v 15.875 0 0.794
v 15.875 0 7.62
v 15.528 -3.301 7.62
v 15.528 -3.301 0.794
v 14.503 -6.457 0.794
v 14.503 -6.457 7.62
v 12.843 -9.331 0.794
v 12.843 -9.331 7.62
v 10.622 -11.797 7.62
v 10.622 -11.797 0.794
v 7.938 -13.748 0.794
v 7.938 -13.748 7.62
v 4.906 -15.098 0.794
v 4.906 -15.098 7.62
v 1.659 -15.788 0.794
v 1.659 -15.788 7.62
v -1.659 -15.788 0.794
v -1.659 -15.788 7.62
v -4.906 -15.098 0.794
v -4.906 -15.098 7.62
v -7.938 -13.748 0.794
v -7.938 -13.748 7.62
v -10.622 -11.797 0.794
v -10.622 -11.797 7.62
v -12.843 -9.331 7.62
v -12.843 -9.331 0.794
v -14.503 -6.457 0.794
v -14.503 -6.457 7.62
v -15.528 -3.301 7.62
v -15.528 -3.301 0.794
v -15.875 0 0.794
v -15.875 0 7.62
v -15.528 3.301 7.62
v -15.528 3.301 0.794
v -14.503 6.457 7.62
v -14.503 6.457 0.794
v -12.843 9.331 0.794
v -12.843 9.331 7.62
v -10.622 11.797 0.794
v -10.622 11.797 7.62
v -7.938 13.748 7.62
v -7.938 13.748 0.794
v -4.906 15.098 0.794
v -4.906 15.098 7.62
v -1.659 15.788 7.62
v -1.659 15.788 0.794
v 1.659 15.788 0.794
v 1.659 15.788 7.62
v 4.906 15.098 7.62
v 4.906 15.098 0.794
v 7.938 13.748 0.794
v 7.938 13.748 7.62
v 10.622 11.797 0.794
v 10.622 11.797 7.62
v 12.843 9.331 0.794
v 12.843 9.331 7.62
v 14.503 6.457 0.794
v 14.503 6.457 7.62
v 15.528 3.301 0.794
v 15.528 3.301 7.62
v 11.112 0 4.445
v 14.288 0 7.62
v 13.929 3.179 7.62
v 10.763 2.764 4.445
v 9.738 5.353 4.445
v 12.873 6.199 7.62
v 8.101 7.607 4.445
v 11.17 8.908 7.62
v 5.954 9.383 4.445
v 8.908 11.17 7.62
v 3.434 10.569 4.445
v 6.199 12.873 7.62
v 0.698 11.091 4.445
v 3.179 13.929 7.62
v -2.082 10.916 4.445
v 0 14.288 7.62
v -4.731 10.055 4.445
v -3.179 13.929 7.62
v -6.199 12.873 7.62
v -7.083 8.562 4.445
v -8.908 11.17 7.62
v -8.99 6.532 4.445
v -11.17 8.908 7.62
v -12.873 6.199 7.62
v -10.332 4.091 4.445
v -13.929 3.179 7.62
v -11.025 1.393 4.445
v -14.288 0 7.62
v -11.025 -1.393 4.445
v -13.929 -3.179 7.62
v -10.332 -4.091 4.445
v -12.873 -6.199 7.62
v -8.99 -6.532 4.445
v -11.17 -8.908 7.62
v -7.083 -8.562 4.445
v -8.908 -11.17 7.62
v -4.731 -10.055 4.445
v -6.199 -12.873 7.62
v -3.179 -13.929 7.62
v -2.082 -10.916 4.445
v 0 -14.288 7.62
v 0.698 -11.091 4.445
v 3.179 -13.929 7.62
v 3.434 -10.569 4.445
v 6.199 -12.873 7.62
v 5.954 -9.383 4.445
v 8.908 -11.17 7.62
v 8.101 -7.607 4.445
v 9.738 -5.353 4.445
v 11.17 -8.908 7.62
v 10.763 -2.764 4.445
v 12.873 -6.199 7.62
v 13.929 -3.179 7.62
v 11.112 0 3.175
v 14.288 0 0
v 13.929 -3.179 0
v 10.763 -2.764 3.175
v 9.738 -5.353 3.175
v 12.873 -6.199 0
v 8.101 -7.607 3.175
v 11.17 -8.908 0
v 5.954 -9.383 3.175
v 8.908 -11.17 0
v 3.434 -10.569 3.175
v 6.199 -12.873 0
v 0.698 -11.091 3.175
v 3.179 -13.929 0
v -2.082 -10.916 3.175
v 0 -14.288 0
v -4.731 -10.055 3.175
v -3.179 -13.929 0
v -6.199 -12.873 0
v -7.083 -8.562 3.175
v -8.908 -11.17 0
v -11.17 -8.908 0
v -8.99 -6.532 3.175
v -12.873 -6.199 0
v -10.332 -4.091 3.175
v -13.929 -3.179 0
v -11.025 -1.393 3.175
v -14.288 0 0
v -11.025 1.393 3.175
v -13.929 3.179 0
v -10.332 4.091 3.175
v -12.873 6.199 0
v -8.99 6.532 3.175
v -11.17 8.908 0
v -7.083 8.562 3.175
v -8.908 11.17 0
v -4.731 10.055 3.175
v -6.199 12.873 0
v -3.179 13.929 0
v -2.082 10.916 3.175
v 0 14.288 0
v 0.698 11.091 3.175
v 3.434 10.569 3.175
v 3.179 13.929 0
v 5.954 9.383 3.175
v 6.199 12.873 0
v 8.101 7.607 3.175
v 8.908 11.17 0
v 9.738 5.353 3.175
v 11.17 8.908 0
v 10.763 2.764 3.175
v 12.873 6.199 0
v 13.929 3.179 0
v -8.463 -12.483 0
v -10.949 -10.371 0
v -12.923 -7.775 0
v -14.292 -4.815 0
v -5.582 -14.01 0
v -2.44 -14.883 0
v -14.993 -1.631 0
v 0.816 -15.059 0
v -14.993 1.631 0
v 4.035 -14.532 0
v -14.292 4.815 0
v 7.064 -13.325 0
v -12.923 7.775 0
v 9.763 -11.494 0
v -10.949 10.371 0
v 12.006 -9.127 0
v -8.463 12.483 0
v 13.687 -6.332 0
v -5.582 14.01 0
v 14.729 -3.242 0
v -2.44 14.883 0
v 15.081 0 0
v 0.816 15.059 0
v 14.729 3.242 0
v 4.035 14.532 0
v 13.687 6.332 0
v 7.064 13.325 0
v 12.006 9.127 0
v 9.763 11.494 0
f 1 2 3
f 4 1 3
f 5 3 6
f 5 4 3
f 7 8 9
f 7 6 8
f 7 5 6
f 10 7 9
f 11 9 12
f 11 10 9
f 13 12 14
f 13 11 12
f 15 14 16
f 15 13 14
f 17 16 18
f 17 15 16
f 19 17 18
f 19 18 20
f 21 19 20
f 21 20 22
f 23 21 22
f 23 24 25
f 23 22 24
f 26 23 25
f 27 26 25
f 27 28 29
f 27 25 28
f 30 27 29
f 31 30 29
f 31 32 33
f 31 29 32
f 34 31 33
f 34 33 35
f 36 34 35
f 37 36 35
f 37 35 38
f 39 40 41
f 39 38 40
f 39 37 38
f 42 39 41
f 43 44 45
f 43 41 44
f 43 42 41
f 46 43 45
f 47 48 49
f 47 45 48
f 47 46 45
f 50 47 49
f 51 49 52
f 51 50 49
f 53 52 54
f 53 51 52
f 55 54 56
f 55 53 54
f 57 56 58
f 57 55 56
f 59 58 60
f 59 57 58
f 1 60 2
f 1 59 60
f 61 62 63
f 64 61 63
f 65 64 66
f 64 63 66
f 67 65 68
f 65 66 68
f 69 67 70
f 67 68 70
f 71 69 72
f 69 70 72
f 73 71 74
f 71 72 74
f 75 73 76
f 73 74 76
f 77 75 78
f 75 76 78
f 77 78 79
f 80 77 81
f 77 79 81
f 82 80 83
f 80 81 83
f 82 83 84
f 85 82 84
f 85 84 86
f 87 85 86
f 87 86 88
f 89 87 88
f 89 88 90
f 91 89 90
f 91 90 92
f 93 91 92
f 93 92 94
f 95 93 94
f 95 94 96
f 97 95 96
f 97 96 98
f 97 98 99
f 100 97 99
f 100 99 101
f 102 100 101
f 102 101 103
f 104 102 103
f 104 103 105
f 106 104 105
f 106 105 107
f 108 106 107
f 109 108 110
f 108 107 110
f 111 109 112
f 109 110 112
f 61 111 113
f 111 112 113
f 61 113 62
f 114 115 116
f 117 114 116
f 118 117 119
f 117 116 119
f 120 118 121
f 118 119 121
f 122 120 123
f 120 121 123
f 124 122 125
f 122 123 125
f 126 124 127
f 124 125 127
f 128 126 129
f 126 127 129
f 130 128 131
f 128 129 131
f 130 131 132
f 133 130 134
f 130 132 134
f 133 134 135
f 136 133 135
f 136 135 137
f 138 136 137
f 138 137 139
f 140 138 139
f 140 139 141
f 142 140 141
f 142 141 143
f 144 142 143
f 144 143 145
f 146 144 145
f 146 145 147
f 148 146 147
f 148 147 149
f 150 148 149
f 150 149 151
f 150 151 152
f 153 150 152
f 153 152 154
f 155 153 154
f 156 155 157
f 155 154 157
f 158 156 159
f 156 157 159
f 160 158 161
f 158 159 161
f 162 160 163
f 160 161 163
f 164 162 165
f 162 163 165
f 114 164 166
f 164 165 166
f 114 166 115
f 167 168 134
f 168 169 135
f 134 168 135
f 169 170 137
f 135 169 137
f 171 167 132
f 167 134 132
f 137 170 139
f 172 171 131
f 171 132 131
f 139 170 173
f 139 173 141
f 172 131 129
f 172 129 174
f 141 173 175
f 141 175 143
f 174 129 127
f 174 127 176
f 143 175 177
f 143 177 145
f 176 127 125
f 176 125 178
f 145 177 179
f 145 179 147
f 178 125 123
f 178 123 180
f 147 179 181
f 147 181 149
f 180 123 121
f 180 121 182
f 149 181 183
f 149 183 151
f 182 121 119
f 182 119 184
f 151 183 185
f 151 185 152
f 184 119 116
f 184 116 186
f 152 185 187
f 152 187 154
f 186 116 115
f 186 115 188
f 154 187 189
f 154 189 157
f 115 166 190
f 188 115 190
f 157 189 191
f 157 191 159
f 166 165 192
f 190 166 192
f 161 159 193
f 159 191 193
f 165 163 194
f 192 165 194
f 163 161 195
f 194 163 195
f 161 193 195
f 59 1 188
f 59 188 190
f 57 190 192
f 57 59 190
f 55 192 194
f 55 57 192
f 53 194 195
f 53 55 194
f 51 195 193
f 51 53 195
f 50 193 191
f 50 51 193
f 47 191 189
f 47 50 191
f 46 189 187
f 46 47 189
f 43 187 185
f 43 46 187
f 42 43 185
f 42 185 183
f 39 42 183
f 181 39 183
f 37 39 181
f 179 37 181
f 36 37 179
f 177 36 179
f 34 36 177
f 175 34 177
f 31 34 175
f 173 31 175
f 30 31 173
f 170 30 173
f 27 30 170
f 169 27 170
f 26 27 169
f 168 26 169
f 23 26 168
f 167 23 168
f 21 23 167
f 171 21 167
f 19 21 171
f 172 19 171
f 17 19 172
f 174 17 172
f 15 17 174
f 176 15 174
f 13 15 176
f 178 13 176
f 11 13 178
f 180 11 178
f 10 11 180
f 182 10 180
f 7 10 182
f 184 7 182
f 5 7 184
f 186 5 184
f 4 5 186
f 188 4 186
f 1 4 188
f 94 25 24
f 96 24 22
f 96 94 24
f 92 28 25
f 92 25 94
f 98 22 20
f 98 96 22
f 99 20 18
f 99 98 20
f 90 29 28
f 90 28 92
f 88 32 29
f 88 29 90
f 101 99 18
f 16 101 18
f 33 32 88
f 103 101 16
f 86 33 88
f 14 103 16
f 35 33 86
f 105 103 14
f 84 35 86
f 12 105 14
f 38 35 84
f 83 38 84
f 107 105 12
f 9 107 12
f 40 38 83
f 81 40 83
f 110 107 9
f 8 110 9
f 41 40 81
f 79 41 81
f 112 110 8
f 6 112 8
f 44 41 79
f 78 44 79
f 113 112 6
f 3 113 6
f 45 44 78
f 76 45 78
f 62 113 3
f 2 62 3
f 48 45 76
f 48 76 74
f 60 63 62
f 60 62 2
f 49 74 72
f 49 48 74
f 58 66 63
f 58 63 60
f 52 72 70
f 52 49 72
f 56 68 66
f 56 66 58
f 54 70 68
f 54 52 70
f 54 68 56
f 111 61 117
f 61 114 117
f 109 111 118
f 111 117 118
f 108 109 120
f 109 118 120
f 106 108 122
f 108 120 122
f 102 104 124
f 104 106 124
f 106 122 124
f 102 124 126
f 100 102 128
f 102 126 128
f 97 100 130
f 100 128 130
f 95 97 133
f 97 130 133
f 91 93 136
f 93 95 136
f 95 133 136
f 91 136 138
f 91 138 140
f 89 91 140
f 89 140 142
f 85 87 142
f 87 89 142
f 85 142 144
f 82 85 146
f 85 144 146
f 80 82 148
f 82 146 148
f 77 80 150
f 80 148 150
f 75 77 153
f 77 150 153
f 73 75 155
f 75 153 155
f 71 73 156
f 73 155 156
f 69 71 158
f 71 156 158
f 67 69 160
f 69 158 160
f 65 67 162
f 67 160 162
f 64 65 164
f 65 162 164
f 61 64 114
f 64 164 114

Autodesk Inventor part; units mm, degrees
ref_plane "YZ Plane" through (0, 0, 0) normal (1, 0, 0) x (0, 1, 0)
ref_plane "XZ Plane" through (0, 0, 0) normal (0, 1, 0) x (-1, 0, 0)
ref_plane "XY Plane" through (0, 0, 0) normal (0, 0, 1) x (1, 0, 0)
sketch "Sketch1" plane through (0, 0, 0) normal (0, 0, 1) x (1, 0, 0)
  circle A0 centre (0, 0) radius 11.1125
  circle A1 centre (0, 0) radius 15.875
  dimension "d0" = 22.225
  dimension "d1" = 31.75
extrude "Extrusion1" add sketch "Sketch1" along normal blind 7.62
chamfer "Chamfer1" distance 0.7937 angle 45 1 edges at (-15.875, 0, 0)
chamfer "Chamfer2" distance 3.175 angle 45 2 edges at (-11.1125, 0, 7.62) (-11.1125, 0, 0)
equation "\"d1\" = Wheel_OD"
equation "\"Wheel_OD\" = 31.75"
properties part number "Tire" material "Rubber, Silicone"
